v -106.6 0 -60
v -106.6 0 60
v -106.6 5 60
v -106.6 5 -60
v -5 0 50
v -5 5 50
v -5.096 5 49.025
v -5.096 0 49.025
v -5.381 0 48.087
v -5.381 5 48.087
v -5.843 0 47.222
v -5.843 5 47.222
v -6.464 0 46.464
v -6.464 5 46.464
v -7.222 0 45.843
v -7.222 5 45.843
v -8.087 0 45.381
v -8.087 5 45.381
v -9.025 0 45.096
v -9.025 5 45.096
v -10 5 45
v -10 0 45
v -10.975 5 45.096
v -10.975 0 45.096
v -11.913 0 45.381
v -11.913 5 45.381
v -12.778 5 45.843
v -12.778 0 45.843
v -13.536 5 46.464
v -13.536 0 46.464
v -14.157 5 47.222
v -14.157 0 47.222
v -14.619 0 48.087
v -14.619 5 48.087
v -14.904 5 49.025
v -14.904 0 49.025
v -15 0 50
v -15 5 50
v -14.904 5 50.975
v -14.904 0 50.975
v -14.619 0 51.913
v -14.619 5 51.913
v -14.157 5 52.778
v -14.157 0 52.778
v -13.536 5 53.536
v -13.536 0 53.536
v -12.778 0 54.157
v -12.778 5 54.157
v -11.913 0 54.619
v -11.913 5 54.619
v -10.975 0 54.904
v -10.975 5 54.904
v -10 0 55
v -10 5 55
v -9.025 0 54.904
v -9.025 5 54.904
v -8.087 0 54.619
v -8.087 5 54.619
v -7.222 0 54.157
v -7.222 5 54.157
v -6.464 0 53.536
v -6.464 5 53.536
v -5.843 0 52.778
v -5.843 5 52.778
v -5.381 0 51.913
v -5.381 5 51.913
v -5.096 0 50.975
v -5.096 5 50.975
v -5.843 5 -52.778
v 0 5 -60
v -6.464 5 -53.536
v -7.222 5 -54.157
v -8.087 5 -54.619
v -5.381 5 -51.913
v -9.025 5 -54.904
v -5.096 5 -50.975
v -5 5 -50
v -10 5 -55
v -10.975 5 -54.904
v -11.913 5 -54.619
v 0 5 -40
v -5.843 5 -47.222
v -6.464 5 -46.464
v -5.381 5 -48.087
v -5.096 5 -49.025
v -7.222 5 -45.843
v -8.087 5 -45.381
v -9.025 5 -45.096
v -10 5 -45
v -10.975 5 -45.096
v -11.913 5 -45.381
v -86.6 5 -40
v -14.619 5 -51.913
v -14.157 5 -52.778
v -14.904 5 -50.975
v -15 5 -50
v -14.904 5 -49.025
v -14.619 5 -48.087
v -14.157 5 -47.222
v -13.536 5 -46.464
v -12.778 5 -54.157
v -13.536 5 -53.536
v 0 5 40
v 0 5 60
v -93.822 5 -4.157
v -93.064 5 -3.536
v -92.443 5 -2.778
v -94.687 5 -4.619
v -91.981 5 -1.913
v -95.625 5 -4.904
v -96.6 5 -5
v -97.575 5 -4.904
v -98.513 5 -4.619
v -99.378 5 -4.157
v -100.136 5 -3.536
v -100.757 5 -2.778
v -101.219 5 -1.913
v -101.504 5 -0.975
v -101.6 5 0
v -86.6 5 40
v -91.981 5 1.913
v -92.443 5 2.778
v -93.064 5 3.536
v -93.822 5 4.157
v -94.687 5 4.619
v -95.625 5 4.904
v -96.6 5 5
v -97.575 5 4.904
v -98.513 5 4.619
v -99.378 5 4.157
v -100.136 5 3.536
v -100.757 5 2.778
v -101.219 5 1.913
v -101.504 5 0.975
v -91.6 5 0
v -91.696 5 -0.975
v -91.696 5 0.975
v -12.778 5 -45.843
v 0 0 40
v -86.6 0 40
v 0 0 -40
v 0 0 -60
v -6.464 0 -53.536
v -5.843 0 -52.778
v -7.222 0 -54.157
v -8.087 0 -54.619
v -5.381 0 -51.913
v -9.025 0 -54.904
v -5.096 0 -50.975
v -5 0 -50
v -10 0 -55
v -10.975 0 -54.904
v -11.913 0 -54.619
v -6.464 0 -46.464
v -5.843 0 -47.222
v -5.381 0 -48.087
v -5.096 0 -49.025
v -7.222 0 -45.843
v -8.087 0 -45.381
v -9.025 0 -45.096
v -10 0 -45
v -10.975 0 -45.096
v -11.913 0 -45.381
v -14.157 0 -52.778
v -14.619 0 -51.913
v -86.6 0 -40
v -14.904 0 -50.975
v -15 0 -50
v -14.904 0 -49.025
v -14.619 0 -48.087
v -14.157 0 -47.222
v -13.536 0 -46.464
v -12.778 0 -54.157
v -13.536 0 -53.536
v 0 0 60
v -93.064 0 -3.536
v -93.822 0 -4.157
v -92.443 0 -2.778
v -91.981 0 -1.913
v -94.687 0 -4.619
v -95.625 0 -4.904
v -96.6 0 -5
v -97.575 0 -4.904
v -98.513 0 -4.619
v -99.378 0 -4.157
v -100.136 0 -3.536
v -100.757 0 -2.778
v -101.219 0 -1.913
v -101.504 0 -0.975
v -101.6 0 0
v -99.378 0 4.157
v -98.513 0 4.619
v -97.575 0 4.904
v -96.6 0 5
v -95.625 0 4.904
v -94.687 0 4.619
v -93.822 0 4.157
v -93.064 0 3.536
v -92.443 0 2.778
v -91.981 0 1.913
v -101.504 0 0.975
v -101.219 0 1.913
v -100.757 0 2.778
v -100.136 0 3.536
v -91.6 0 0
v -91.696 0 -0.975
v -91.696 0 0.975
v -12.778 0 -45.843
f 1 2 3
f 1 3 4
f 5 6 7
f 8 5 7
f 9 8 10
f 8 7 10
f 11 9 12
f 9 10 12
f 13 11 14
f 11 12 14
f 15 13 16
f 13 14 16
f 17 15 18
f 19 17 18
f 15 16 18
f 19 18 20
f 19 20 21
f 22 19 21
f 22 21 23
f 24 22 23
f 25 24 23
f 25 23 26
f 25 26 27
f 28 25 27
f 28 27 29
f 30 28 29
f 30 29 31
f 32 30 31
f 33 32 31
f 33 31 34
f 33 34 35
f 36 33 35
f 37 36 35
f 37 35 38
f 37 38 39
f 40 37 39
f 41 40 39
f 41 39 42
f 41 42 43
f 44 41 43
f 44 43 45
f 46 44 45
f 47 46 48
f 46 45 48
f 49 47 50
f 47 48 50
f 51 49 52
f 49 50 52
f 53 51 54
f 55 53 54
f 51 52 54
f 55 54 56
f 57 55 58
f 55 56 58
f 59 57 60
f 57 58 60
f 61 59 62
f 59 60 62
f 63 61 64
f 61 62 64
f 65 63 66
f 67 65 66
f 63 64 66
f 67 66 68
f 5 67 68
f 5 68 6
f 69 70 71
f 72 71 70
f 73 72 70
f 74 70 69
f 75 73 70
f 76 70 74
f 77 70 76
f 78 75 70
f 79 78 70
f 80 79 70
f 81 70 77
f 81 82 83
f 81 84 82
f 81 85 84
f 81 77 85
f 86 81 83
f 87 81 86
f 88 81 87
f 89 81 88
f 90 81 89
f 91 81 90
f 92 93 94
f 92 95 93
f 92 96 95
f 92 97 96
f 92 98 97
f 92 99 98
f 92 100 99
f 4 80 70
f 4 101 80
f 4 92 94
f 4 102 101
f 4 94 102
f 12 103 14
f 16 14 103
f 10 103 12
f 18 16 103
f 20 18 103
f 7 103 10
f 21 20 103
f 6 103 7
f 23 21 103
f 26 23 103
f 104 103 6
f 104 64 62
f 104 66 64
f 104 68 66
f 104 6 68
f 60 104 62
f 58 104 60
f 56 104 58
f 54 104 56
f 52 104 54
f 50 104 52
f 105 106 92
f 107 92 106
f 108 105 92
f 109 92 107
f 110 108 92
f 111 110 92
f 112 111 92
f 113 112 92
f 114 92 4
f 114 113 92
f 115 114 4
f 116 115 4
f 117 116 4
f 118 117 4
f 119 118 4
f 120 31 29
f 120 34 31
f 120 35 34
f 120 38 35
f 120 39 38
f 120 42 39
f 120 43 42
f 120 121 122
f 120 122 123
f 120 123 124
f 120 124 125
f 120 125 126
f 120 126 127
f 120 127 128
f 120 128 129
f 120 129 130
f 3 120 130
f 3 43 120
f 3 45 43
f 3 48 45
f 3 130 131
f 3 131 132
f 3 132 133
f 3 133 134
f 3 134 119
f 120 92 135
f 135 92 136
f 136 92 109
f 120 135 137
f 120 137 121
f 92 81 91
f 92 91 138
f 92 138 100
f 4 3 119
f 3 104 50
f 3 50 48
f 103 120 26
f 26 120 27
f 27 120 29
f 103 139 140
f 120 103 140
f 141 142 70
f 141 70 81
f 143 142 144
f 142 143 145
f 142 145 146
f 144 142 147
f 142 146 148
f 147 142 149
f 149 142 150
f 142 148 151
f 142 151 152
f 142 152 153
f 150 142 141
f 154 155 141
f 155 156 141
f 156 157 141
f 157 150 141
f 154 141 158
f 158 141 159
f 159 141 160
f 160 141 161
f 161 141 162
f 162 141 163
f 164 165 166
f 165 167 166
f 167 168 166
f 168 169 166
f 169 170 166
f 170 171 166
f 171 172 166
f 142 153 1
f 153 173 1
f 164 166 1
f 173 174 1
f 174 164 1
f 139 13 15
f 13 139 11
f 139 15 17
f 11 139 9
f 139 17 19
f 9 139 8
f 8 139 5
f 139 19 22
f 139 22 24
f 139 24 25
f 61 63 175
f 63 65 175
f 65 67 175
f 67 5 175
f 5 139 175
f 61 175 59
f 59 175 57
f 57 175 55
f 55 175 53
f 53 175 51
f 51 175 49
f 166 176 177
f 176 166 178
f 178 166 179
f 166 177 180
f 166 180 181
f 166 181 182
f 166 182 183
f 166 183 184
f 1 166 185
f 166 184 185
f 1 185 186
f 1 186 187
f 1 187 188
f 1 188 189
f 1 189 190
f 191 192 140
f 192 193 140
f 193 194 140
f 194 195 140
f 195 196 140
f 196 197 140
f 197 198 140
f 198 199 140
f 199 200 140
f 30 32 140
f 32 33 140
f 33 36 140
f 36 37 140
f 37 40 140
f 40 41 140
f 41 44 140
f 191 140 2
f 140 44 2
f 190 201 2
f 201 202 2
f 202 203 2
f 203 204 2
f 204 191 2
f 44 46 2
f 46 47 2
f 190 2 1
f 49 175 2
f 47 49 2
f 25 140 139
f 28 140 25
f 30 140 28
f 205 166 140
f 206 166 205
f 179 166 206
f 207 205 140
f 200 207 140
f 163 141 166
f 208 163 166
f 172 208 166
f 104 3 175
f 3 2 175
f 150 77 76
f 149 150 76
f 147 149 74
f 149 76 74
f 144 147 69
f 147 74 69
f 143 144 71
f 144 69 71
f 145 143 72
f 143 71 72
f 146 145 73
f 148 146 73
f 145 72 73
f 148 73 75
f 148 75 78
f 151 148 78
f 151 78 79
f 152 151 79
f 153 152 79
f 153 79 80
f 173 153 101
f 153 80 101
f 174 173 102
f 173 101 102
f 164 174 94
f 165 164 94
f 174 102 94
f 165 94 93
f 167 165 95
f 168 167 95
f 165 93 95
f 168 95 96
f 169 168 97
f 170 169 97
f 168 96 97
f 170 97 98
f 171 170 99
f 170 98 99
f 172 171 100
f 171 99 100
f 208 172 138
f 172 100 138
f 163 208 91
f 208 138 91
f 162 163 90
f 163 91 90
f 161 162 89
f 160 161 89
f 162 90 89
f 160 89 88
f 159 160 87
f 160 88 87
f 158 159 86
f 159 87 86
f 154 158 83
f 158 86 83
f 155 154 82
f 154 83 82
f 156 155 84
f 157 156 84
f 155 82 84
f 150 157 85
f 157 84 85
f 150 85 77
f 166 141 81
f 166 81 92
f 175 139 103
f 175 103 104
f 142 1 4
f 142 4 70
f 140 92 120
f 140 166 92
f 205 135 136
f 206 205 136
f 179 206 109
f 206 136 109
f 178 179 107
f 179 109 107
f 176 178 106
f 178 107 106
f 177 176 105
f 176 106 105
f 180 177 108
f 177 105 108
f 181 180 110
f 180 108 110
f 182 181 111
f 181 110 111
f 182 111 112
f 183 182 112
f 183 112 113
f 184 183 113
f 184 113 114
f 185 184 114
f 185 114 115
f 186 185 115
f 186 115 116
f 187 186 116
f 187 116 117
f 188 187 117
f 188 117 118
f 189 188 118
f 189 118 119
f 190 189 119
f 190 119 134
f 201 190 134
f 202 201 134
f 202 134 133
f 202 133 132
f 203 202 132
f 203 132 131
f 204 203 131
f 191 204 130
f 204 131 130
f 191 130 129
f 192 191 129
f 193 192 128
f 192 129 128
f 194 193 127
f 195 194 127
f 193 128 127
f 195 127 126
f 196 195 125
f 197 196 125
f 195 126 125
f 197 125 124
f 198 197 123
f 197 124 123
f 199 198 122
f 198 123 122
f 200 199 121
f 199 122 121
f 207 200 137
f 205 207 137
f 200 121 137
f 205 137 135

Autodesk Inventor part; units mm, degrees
ref_plane "YZ Plane" through (0, 0, 0) normal (1, 0, 0) x (0, 1, 0)
ref_plane "XZ Plane" through (0, 0, 0) normal (0, 1, 0) x (-1, 0, 0)
ref_plane "XY Plane" through (0, 0, 0) normal (0, 0, 1) x (1, 0, 0)
sketch "スケッチ1" plane through (0, 0, 0) normal (0, 1, 0) x (-1, 0, 0)
  line L0 (127.92, 0) -> (-21.32, 0) projected
  line L1 (0, -84) -> (0, 84) projected
  line L2 (106.6, 0) -> (106.6, -60)
  line L3 (106.6, -60) -> (0, -60)
  line L4 (0, -40) -> (86.6, -40)
  line L5 (86.6, -40) -> (86.6, 0)
  line L6 (106.6, 0) -> (106.6, 60)
  line L7 (106.6, 60) -> (0, 60)
  line L8 (0, 40) -> (86.6, 40)
  line L9 (86.6, 40) -> (86.6, 0)
  line L10 (0, 60) -> (0, 40)
  line L11 (0, -40) -> (0, -60)
  point P0 (0, 0)
  dimension "d0" = 20
  dimension "d4" = 20
  dimension "d15" = 60
  dimension "d16" = 106.6
extrude "押し出し1" add sketch "スケッチ1" along normal blind 5 contours L2 L3 L1 L4 L5 L0 | L0 L9 L8 L1 L7 L6
sketch "スケッチ2" plane through (0, 5, 0) normal (0, 1, 0) x (1, 0, 0)
  circle A0 centre (-10, -50) radius 5
  line L0 (0, -60) -> (0, -40) projected
  line L1 (-106.6, -60) -> (0, -60) projected
  line L2 (-127.92, 0) -> (21.32, 0) projected
  circle A1 centre (-10, 50) radius 5
  circle A2 centre (-96.6, 0) radius 5
  line L3 (-86.6, -40) -> (-86.6, 40) projected
  point P0 (0, 0)
  dimension "d8" = 10
  dimension "d9" = 10
  dimension "d10" = 10
  dimension "d11" = 10
  dimension "d12" = 10
extrude "押し出し2" cut sketch "スケッチ2" against normal blind 5
properties part number "bogie_square" material "アルミニウム 6061"
